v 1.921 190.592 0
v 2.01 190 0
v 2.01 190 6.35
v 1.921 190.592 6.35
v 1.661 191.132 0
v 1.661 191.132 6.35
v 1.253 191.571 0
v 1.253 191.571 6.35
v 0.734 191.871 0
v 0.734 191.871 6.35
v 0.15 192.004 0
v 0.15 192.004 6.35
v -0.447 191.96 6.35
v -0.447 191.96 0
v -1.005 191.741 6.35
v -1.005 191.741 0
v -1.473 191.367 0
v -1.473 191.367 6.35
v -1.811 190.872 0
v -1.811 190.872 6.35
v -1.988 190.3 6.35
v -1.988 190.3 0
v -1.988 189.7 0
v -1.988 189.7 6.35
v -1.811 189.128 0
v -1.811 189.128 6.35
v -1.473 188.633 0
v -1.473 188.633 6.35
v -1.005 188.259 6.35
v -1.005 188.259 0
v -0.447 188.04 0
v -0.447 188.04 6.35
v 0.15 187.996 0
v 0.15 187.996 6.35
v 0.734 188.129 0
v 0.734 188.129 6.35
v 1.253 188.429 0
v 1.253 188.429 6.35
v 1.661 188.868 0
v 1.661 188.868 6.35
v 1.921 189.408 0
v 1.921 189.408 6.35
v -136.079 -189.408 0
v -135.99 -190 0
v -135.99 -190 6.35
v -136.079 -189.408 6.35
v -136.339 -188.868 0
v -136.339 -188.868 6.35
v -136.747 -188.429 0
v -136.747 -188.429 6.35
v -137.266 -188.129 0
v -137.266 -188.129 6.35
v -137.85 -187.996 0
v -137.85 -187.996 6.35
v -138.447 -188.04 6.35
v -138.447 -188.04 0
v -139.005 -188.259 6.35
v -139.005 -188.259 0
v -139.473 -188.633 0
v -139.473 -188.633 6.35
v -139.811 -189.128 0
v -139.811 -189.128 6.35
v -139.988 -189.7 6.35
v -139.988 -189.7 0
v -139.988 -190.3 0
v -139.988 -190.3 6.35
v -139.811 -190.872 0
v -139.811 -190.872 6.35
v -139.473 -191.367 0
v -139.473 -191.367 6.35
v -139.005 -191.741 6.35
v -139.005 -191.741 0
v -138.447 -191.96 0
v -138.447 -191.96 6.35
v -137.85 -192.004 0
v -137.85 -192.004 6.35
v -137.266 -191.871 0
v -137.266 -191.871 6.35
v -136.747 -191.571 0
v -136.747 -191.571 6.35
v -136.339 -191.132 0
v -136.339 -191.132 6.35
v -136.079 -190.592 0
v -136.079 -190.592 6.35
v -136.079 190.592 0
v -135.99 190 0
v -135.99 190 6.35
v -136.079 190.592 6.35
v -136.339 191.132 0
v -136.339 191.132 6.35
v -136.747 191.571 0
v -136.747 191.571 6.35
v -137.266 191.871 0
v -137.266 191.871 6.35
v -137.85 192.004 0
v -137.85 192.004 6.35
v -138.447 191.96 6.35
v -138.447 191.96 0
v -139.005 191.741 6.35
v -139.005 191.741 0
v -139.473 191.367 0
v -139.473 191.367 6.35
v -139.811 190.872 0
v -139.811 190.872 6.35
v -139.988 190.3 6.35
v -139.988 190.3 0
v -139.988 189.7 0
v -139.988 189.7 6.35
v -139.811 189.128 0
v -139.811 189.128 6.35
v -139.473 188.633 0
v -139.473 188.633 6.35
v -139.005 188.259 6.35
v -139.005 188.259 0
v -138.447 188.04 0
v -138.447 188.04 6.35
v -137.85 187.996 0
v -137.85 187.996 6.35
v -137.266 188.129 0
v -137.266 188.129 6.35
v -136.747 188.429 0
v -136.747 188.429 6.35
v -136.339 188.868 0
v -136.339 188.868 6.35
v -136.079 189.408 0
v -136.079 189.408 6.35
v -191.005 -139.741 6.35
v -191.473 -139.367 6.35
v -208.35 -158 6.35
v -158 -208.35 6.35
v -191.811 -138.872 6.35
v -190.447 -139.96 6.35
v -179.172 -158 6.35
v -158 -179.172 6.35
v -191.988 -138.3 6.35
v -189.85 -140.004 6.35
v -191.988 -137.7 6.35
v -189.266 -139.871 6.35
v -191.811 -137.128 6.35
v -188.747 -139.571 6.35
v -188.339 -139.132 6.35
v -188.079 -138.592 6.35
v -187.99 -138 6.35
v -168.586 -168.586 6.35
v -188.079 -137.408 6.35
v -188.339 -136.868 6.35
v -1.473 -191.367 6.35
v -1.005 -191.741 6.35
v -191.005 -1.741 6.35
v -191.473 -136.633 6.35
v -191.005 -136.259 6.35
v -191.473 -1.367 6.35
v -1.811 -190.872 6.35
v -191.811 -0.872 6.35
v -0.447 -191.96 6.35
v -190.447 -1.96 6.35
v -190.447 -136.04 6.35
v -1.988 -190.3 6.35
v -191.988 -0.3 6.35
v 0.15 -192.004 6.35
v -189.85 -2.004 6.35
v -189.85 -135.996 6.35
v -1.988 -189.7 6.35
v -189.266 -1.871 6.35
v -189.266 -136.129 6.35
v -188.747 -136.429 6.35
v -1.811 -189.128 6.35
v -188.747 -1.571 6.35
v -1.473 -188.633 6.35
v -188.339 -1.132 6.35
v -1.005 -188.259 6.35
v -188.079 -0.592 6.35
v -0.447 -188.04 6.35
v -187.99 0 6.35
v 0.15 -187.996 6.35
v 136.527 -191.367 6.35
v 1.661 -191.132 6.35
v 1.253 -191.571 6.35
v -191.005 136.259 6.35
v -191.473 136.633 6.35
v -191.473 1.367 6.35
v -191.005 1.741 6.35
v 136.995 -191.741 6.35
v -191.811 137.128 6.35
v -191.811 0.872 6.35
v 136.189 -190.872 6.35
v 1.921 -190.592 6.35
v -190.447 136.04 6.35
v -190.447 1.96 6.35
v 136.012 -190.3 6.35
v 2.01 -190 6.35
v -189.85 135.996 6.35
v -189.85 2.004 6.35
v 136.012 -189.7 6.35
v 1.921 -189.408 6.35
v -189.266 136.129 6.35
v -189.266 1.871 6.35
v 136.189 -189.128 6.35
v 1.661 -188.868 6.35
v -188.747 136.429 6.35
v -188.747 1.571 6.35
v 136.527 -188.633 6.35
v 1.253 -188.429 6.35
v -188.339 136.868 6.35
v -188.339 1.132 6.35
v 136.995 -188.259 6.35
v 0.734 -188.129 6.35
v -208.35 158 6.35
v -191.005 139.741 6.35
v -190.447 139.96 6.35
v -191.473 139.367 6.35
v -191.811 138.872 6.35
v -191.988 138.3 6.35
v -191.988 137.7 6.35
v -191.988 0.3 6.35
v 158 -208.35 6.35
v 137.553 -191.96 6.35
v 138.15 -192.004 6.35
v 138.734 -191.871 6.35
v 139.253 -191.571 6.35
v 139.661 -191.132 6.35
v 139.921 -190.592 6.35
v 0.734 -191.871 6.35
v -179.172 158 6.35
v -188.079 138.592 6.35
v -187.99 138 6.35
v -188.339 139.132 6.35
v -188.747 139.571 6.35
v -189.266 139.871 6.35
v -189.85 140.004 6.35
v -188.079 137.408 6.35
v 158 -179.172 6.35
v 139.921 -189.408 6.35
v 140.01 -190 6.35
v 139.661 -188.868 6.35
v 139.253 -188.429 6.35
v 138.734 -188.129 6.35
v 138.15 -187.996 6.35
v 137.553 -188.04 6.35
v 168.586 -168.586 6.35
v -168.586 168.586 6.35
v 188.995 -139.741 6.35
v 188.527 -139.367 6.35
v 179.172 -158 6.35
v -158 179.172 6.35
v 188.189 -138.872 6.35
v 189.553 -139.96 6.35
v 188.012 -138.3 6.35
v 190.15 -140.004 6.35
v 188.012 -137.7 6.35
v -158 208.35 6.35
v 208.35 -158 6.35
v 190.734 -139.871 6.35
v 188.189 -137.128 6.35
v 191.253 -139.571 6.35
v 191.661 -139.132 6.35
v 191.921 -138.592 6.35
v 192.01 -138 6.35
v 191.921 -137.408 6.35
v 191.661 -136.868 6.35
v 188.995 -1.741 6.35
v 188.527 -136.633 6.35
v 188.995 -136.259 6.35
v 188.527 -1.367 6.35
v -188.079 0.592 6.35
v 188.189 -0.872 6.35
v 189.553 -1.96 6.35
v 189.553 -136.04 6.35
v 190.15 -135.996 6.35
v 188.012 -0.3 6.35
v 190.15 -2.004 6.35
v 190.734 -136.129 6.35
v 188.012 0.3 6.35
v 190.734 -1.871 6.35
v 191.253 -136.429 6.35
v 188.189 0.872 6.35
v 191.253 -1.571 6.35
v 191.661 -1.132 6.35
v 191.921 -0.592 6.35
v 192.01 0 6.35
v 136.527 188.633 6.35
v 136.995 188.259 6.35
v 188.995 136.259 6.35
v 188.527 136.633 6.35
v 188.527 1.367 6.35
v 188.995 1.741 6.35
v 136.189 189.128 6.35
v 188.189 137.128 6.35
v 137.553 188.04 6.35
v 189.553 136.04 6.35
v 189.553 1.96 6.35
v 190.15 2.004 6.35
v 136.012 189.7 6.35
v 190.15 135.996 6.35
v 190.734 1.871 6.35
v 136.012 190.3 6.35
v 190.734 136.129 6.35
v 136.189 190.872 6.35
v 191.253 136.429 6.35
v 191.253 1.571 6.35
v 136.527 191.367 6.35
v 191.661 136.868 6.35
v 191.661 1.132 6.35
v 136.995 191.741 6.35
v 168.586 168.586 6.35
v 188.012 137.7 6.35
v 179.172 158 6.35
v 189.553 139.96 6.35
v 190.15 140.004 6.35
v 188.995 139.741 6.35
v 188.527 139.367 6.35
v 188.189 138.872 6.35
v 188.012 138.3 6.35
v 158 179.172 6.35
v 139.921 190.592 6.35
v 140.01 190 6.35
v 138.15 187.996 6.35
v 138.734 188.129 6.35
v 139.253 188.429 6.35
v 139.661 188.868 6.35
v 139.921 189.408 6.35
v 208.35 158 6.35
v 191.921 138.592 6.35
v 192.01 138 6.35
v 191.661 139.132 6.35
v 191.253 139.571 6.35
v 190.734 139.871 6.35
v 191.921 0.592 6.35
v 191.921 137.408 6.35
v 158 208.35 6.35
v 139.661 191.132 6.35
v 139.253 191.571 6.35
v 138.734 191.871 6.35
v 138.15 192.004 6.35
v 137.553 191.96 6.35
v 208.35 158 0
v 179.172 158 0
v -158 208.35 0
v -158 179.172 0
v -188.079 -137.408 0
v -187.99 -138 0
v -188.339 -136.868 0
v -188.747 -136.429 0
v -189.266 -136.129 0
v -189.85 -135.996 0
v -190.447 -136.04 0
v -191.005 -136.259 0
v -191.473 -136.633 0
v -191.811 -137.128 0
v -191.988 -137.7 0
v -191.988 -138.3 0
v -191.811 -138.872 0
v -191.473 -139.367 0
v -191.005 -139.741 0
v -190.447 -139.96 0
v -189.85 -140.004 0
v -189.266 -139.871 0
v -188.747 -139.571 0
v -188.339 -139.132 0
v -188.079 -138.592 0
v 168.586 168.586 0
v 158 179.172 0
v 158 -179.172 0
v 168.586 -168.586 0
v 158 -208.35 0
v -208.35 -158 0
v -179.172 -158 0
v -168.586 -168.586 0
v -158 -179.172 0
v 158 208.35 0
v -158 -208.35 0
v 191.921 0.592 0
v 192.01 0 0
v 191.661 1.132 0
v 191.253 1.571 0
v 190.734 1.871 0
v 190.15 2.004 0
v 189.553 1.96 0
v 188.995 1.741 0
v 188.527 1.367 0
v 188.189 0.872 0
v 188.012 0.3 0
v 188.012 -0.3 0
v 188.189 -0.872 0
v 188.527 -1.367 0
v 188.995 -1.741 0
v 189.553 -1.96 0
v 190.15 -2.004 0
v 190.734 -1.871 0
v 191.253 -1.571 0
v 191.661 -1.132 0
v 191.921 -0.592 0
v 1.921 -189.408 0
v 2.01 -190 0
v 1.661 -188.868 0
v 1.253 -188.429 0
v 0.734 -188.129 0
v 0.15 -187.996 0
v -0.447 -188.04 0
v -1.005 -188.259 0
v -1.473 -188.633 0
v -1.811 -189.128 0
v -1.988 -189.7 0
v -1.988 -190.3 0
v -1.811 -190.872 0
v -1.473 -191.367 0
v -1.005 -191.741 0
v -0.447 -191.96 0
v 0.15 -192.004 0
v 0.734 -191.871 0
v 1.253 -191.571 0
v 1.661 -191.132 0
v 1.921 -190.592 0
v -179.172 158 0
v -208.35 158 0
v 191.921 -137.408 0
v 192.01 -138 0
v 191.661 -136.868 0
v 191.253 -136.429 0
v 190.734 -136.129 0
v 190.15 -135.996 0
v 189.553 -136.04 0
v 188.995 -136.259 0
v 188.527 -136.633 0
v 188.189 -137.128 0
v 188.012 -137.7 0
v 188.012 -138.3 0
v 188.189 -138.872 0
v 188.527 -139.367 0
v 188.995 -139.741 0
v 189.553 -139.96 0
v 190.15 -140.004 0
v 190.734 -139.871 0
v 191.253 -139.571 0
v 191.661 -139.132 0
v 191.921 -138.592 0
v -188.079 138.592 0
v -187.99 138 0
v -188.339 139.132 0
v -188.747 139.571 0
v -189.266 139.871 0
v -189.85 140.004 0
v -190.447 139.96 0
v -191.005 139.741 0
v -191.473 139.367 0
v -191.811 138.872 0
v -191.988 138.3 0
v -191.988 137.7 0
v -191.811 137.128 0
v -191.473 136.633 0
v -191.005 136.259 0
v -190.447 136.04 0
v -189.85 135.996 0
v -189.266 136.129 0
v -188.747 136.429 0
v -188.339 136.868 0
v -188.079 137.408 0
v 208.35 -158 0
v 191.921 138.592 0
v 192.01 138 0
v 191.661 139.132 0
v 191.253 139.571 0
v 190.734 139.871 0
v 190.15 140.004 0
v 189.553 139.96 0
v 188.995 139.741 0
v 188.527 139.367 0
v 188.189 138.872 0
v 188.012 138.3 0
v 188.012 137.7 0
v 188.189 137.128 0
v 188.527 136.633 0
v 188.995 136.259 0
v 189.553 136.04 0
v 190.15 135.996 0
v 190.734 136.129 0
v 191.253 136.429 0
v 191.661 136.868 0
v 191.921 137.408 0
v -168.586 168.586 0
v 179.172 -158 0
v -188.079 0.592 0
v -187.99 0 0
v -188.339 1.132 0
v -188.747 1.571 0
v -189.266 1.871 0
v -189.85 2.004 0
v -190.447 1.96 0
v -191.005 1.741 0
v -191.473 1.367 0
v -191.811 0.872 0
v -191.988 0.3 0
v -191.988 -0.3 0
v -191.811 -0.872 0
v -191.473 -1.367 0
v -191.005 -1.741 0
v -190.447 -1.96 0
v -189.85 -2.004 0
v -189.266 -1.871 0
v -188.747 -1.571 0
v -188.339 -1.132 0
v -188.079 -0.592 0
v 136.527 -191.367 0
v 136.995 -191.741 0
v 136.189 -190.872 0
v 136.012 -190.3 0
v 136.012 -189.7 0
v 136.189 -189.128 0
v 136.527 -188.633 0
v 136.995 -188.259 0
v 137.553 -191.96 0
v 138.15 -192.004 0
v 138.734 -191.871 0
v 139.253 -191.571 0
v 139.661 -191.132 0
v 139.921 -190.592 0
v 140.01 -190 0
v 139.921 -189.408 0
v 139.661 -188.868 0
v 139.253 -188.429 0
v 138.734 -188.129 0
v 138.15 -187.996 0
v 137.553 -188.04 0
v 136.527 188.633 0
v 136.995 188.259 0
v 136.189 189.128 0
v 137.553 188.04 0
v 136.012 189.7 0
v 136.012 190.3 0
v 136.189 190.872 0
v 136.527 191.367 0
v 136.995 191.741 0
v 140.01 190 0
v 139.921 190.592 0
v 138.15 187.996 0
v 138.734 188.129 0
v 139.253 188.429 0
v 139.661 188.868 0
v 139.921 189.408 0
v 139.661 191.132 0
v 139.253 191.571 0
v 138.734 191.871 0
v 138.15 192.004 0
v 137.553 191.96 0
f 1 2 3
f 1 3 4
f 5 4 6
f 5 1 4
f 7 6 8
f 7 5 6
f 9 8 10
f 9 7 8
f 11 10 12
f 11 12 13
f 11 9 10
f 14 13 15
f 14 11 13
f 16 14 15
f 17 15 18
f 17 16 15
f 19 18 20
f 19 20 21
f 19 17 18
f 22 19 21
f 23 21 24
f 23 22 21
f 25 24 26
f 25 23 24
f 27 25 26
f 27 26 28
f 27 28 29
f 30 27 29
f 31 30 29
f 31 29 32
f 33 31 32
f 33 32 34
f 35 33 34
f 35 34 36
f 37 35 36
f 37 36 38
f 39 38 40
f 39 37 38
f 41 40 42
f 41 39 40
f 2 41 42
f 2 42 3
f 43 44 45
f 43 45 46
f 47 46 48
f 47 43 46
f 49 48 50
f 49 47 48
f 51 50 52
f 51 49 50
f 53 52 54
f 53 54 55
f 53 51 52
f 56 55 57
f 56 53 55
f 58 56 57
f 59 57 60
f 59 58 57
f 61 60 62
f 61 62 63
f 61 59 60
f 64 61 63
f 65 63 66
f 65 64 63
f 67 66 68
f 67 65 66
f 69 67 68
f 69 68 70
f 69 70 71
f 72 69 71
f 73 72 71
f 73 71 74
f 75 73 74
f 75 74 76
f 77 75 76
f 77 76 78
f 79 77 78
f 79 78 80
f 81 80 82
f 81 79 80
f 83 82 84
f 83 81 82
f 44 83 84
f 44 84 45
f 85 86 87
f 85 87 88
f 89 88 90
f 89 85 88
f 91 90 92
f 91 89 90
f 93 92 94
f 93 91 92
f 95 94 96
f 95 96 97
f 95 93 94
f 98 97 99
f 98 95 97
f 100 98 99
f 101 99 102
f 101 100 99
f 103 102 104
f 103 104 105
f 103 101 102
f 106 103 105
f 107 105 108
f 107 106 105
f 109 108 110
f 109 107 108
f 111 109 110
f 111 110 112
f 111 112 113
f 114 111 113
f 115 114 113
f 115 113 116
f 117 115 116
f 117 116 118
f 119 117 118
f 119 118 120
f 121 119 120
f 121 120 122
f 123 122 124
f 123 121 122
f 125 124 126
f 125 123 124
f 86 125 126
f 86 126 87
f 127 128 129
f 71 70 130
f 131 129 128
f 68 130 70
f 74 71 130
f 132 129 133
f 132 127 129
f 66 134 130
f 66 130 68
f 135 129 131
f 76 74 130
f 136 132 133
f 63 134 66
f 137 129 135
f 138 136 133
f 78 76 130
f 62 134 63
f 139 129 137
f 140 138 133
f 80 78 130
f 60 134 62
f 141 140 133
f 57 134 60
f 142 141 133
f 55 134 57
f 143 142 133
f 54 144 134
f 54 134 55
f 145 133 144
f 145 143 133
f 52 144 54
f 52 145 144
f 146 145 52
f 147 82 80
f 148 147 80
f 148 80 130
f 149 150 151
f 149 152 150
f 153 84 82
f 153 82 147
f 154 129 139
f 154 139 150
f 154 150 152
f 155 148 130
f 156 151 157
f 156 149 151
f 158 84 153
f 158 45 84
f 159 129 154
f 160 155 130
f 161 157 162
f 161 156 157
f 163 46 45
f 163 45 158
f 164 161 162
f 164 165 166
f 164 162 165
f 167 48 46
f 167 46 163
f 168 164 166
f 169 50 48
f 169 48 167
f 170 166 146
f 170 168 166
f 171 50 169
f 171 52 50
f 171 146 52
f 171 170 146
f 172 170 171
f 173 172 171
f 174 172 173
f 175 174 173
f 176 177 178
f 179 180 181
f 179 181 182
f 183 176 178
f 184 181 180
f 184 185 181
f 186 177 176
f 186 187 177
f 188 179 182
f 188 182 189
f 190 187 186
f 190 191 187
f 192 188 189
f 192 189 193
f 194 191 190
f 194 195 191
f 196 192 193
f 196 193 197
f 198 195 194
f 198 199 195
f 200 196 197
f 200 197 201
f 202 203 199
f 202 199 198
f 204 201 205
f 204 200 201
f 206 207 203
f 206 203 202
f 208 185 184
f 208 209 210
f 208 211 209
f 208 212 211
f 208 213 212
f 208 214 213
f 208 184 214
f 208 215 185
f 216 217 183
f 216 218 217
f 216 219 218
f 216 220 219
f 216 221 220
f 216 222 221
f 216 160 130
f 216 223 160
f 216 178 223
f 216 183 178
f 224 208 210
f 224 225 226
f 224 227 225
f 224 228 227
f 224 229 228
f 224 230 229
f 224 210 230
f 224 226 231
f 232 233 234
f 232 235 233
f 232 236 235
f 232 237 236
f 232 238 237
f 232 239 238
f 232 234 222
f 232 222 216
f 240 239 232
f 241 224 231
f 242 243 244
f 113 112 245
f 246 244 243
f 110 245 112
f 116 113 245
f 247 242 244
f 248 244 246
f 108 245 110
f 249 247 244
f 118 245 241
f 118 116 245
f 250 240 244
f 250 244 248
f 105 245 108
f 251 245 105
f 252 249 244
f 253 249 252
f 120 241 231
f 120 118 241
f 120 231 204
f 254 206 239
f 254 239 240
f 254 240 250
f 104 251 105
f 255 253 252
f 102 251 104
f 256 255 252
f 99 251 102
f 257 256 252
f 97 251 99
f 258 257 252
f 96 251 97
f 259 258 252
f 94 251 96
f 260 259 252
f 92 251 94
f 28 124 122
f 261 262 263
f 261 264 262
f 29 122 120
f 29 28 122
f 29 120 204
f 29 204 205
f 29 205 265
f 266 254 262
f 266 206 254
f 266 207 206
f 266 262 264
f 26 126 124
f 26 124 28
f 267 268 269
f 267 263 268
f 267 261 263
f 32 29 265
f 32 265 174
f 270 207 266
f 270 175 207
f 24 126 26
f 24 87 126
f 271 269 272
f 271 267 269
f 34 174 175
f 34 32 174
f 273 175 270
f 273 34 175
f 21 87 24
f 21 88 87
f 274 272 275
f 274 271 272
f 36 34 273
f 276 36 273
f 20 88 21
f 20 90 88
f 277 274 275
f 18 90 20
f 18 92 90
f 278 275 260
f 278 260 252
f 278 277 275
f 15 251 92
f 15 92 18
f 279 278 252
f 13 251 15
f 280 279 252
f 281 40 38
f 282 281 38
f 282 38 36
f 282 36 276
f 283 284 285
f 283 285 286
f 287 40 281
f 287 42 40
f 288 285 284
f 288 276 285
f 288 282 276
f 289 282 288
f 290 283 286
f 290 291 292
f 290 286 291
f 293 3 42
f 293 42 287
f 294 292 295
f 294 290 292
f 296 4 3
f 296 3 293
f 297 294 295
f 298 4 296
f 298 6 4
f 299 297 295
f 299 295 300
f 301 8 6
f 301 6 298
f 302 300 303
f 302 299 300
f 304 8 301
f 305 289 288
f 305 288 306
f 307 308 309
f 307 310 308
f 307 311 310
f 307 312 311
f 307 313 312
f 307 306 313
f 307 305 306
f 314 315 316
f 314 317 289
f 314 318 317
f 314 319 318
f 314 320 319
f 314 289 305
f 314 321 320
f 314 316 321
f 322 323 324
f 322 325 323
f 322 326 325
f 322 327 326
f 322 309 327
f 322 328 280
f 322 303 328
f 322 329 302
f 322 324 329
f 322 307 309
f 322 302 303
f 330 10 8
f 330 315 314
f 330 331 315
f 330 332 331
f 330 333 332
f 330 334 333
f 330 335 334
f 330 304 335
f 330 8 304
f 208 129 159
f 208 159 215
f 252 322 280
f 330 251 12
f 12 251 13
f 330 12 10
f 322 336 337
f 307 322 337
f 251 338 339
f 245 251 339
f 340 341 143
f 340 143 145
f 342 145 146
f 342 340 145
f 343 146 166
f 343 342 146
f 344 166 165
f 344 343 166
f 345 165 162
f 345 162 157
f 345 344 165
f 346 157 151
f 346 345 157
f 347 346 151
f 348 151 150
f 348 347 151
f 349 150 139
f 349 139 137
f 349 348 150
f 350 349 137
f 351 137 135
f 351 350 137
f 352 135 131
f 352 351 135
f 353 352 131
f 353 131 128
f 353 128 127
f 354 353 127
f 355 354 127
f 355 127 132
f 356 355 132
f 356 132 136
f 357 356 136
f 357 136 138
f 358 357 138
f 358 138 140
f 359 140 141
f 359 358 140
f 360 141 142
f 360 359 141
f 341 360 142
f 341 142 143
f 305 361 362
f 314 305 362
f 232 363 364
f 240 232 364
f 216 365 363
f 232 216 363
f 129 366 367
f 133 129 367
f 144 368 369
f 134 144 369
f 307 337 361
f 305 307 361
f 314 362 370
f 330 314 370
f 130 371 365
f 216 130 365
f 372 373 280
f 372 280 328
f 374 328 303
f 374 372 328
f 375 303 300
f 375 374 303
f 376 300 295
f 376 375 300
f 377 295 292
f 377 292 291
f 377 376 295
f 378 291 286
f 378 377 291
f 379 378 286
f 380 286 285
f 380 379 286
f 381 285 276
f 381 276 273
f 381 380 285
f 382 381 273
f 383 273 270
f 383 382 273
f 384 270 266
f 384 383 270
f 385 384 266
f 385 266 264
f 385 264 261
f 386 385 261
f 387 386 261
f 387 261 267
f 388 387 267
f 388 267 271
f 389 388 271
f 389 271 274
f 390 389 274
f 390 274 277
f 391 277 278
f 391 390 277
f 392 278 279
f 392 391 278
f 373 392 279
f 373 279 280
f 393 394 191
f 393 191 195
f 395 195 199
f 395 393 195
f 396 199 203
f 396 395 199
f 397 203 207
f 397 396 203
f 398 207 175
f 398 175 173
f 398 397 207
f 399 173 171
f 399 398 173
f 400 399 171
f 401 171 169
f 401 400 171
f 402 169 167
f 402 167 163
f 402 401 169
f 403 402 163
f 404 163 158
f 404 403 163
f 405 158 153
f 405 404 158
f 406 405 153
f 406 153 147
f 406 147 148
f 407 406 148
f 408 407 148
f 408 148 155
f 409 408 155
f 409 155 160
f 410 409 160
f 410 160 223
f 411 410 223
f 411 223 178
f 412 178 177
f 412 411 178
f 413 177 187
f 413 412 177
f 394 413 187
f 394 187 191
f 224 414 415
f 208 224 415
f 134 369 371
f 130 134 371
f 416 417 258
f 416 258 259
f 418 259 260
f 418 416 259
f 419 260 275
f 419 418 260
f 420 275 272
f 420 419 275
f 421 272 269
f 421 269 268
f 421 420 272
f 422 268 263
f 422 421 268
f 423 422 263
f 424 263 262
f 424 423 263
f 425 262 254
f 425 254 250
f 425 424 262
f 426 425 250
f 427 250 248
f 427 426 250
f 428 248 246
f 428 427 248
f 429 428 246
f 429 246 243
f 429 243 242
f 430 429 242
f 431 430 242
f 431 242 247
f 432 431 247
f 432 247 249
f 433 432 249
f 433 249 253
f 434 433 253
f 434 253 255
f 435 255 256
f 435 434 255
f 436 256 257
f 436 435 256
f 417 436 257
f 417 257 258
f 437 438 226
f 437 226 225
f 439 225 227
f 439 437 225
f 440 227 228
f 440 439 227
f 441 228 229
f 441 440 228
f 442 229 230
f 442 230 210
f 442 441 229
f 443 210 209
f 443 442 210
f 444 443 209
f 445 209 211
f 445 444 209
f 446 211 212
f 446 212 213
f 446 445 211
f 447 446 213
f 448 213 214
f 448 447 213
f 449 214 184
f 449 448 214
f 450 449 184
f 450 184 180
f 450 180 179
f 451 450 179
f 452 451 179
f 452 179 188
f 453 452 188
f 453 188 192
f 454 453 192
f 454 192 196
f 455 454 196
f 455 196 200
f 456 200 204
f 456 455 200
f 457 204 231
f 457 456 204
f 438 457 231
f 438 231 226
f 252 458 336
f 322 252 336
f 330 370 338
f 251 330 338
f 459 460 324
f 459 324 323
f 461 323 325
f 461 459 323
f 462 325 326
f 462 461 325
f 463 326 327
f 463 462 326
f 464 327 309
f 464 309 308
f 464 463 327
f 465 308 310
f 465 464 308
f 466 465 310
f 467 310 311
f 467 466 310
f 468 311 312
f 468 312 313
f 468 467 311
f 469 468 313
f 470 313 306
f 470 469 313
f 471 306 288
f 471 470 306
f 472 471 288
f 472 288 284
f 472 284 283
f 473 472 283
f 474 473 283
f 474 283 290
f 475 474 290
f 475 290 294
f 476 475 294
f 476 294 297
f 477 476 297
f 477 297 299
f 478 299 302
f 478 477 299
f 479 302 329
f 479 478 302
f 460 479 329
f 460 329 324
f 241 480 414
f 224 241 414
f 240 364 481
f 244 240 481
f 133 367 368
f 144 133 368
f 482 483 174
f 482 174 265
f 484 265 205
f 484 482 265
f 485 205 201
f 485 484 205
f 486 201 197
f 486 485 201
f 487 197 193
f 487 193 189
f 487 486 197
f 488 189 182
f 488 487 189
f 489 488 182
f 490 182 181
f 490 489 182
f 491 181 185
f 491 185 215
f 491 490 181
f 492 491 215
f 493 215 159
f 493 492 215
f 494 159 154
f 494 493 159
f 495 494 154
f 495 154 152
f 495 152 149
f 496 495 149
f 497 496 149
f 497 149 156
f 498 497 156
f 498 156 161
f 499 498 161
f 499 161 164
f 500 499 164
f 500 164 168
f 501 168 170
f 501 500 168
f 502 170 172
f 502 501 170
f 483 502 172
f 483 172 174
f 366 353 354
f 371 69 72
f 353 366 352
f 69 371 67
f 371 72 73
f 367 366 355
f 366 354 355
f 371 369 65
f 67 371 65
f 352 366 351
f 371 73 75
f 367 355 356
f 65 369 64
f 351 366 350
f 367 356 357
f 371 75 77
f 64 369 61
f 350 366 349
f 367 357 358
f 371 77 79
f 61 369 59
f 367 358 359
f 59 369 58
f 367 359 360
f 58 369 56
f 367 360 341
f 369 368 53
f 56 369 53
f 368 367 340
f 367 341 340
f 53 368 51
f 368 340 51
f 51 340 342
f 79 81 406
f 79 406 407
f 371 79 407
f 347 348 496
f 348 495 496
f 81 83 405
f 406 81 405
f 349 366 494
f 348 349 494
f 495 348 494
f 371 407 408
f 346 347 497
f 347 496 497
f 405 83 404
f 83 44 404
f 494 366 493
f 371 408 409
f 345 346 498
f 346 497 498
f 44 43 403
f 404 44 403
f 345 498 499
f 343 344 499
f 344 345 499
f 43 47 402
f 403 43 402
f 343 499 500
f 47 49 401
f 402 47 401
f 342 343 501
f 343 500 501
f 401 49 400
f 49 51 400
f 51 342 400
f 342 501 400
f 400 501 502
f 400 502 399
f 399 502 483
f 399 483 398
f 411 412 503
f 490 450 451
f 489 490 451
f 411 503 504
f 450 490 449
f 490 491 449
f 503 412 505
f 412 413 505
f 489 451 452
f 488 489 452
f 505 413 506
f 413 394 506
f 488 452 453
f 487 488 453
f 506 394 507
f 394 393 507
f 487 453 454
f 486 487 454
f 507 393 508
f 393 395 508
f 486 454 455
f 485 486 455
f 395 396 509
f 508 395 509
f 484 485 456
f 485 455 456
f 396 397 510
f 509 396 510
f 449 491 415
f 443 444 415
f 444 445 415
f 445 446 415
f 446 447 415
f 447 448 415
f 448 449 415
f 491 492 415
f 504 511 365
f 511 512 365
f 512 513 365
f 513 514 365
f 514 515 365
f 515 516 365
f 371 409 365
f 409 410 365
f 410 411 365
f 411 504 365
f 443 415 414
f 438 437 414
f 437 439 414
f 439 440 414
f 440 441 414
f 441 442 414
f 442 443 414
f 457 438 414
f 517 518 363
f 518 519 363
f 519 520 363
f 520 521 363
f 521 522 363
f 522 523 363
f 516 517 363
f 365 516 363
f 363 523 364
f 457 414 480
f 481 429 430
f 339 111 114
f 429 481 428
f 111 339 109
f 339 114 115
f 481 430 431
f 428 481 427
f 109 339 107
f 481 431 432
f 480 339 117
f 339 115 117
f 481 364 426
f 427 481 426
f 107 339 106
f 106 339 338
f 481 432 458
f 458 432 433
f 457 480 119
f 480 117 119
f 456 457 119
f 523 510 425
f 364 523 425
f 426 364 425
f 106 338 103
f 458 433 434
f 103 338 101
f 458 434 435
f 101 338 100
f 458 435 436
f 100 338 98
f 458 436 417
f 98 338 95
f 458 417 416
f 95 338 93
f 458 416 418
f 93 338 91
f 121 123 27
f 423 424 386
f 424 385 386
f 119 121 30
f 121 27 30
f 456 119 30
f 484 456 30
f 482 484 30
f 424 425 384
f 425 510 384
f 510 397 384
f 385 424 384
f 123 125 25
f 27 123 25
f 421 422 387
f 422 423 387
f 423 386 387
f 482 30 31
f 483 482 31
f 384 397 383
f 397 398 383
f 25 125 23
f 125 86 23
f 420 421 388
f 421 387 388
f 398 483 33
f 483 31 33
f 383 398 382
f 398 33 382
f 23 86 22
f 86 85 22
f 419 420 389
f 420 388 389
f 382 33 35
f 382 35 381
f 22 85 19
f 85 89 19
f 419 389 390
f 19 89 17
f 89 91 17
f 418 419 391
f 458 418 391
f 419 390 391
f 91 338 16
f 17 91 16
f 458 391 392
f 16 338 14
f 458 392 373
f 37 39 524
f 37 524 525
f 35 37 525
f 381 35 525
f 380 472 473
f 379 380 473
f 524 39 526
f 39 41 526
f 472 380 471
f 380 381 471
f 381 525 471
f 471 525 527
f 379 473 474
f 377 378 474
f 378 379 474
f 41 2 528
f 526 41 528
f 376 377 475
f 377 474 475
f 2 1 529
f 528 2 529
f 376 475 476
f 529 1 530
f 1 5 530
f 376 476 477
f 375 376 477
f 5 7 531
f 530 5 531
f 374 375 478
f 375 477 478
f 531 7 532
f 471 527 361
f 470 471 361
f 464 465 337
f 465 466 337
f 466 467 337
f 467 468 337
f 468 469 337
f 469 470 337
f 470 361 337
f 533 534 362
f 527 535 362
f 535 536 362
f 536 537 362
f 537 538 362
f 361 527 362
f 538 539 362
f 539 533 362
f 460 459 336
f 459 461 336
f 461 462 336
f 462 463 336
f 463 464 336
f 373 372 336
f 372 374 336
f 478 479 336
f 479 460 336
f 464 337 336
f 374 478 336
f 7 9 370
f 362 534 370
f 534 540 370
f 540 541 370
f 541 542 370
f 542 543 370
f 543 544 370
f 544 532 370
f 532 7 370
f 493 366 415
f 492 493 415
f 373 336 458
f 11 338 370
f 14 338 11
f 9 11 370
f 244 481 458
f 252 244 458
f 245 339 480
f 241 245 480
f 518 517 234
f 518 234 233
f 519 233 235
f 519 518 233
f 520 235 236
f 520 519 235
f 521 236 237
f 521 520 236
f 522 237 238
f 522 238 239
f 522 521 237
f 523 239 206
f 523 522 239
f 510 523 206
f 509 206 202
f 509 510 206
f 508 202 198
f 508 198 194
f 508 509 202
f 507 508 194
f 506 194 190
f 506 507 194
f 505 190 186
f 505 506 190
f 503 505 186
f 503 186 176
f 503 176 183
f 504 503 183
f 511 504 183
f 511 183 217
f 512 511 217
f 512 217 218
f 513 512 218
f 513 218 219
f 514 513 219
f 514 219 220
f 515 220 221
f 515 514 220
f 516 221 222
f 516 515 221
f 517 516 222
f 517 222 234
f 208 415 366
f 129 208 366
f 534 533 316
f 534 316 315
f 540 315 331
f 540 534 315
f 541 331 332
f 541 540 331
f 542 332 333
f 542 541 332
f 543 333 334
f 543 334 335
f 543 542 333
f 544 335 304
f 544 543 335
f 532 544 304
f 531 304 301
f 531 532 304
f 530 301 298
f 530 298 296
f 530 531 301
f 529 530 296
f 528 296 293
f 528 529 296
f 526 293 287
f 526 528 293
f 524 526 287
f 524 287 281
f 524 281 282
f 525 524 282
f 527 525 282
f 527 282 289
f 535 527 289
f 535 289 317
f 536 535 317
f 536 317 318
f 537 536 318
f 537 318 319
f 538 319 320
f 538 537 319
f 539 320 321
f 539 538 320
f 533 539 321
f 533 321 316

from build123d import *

# Parameters (mm, degrees)
F0_R     = 2.01
F1_DEPTH = 6.35


with BuildPart() as f1:
    # F0 (on Top) → F1 (new body)
    with BuildSketch(Plane.XY):
        Polygon((-158, 208.35), (-158, 194.175), (-158, 179.1715728753), (-168.5857864376, 168.5857864376), (-179.1715728753, 158), (-194.175, 158), (-208.35, 158), (-208.35, -158), (-194.175, -158), (-179.1715728753, -158), (-168.5857864376, -168.5857864376), (-158, -179.1715728753), (-158, -194.175), (-158, -208.35), (158, -208.35), (158, -194.175), (158, -179.1715728753), (168.5857864376, -168.5857864376), (179.1715728753, -158), (194.175, -158), (208.35, -158), (208.35, 158), (194.175, 158), (179.1715728753, 158), (168.5857864376, 168.5857864376), (158, 179.1715728753), (158, 194.175), (158, 208.35), align=None)
        with Locations((-138, -190)):
            Circle(F0_R, mode=Mode.SUBTRACT)
        with Locations((-190, -138)):
            Circle(F0_R, mode=Mode.SUBTRACT)
        with Locations((0, -190)):
            Circle(F0_R, mode=Mode.SUBTRACT)
        with Locations((138, -190)):
            Circle(F0_R, mode=Mode.SUBTRACT)
        with Locations((190, -138)):
            Circle(F0_R, mode=Mode.SUBTRACT)
        with Locations((-190, 0)):
            Circle(F0_R, mode=Mode.SUBTRACT)
        with Locations((-190, 138)):
            Circle(F0_R, mode=Mode.SUBTRACT)
        with Locations((-138, 190)):
            Circle(F0_R, mode=Mode.SUBTRACT)
        with Locations((190, 0)):
            Circle(F0_R, mode=Mode.SUBTRACT)
        with Locations((0, 190)):
            Circle(F0_R, mode=Mode.SUBTRACT)
        with Locations((190, 138)):
            Circle(F0_R, mode=Mode.SUBTRACT)
        with Locations((138, 190)):
            Circle(F0_R, mode=Mode.SUBTRACT)
    extrude(amount=F1_DEPTH)


solid = f1.part
